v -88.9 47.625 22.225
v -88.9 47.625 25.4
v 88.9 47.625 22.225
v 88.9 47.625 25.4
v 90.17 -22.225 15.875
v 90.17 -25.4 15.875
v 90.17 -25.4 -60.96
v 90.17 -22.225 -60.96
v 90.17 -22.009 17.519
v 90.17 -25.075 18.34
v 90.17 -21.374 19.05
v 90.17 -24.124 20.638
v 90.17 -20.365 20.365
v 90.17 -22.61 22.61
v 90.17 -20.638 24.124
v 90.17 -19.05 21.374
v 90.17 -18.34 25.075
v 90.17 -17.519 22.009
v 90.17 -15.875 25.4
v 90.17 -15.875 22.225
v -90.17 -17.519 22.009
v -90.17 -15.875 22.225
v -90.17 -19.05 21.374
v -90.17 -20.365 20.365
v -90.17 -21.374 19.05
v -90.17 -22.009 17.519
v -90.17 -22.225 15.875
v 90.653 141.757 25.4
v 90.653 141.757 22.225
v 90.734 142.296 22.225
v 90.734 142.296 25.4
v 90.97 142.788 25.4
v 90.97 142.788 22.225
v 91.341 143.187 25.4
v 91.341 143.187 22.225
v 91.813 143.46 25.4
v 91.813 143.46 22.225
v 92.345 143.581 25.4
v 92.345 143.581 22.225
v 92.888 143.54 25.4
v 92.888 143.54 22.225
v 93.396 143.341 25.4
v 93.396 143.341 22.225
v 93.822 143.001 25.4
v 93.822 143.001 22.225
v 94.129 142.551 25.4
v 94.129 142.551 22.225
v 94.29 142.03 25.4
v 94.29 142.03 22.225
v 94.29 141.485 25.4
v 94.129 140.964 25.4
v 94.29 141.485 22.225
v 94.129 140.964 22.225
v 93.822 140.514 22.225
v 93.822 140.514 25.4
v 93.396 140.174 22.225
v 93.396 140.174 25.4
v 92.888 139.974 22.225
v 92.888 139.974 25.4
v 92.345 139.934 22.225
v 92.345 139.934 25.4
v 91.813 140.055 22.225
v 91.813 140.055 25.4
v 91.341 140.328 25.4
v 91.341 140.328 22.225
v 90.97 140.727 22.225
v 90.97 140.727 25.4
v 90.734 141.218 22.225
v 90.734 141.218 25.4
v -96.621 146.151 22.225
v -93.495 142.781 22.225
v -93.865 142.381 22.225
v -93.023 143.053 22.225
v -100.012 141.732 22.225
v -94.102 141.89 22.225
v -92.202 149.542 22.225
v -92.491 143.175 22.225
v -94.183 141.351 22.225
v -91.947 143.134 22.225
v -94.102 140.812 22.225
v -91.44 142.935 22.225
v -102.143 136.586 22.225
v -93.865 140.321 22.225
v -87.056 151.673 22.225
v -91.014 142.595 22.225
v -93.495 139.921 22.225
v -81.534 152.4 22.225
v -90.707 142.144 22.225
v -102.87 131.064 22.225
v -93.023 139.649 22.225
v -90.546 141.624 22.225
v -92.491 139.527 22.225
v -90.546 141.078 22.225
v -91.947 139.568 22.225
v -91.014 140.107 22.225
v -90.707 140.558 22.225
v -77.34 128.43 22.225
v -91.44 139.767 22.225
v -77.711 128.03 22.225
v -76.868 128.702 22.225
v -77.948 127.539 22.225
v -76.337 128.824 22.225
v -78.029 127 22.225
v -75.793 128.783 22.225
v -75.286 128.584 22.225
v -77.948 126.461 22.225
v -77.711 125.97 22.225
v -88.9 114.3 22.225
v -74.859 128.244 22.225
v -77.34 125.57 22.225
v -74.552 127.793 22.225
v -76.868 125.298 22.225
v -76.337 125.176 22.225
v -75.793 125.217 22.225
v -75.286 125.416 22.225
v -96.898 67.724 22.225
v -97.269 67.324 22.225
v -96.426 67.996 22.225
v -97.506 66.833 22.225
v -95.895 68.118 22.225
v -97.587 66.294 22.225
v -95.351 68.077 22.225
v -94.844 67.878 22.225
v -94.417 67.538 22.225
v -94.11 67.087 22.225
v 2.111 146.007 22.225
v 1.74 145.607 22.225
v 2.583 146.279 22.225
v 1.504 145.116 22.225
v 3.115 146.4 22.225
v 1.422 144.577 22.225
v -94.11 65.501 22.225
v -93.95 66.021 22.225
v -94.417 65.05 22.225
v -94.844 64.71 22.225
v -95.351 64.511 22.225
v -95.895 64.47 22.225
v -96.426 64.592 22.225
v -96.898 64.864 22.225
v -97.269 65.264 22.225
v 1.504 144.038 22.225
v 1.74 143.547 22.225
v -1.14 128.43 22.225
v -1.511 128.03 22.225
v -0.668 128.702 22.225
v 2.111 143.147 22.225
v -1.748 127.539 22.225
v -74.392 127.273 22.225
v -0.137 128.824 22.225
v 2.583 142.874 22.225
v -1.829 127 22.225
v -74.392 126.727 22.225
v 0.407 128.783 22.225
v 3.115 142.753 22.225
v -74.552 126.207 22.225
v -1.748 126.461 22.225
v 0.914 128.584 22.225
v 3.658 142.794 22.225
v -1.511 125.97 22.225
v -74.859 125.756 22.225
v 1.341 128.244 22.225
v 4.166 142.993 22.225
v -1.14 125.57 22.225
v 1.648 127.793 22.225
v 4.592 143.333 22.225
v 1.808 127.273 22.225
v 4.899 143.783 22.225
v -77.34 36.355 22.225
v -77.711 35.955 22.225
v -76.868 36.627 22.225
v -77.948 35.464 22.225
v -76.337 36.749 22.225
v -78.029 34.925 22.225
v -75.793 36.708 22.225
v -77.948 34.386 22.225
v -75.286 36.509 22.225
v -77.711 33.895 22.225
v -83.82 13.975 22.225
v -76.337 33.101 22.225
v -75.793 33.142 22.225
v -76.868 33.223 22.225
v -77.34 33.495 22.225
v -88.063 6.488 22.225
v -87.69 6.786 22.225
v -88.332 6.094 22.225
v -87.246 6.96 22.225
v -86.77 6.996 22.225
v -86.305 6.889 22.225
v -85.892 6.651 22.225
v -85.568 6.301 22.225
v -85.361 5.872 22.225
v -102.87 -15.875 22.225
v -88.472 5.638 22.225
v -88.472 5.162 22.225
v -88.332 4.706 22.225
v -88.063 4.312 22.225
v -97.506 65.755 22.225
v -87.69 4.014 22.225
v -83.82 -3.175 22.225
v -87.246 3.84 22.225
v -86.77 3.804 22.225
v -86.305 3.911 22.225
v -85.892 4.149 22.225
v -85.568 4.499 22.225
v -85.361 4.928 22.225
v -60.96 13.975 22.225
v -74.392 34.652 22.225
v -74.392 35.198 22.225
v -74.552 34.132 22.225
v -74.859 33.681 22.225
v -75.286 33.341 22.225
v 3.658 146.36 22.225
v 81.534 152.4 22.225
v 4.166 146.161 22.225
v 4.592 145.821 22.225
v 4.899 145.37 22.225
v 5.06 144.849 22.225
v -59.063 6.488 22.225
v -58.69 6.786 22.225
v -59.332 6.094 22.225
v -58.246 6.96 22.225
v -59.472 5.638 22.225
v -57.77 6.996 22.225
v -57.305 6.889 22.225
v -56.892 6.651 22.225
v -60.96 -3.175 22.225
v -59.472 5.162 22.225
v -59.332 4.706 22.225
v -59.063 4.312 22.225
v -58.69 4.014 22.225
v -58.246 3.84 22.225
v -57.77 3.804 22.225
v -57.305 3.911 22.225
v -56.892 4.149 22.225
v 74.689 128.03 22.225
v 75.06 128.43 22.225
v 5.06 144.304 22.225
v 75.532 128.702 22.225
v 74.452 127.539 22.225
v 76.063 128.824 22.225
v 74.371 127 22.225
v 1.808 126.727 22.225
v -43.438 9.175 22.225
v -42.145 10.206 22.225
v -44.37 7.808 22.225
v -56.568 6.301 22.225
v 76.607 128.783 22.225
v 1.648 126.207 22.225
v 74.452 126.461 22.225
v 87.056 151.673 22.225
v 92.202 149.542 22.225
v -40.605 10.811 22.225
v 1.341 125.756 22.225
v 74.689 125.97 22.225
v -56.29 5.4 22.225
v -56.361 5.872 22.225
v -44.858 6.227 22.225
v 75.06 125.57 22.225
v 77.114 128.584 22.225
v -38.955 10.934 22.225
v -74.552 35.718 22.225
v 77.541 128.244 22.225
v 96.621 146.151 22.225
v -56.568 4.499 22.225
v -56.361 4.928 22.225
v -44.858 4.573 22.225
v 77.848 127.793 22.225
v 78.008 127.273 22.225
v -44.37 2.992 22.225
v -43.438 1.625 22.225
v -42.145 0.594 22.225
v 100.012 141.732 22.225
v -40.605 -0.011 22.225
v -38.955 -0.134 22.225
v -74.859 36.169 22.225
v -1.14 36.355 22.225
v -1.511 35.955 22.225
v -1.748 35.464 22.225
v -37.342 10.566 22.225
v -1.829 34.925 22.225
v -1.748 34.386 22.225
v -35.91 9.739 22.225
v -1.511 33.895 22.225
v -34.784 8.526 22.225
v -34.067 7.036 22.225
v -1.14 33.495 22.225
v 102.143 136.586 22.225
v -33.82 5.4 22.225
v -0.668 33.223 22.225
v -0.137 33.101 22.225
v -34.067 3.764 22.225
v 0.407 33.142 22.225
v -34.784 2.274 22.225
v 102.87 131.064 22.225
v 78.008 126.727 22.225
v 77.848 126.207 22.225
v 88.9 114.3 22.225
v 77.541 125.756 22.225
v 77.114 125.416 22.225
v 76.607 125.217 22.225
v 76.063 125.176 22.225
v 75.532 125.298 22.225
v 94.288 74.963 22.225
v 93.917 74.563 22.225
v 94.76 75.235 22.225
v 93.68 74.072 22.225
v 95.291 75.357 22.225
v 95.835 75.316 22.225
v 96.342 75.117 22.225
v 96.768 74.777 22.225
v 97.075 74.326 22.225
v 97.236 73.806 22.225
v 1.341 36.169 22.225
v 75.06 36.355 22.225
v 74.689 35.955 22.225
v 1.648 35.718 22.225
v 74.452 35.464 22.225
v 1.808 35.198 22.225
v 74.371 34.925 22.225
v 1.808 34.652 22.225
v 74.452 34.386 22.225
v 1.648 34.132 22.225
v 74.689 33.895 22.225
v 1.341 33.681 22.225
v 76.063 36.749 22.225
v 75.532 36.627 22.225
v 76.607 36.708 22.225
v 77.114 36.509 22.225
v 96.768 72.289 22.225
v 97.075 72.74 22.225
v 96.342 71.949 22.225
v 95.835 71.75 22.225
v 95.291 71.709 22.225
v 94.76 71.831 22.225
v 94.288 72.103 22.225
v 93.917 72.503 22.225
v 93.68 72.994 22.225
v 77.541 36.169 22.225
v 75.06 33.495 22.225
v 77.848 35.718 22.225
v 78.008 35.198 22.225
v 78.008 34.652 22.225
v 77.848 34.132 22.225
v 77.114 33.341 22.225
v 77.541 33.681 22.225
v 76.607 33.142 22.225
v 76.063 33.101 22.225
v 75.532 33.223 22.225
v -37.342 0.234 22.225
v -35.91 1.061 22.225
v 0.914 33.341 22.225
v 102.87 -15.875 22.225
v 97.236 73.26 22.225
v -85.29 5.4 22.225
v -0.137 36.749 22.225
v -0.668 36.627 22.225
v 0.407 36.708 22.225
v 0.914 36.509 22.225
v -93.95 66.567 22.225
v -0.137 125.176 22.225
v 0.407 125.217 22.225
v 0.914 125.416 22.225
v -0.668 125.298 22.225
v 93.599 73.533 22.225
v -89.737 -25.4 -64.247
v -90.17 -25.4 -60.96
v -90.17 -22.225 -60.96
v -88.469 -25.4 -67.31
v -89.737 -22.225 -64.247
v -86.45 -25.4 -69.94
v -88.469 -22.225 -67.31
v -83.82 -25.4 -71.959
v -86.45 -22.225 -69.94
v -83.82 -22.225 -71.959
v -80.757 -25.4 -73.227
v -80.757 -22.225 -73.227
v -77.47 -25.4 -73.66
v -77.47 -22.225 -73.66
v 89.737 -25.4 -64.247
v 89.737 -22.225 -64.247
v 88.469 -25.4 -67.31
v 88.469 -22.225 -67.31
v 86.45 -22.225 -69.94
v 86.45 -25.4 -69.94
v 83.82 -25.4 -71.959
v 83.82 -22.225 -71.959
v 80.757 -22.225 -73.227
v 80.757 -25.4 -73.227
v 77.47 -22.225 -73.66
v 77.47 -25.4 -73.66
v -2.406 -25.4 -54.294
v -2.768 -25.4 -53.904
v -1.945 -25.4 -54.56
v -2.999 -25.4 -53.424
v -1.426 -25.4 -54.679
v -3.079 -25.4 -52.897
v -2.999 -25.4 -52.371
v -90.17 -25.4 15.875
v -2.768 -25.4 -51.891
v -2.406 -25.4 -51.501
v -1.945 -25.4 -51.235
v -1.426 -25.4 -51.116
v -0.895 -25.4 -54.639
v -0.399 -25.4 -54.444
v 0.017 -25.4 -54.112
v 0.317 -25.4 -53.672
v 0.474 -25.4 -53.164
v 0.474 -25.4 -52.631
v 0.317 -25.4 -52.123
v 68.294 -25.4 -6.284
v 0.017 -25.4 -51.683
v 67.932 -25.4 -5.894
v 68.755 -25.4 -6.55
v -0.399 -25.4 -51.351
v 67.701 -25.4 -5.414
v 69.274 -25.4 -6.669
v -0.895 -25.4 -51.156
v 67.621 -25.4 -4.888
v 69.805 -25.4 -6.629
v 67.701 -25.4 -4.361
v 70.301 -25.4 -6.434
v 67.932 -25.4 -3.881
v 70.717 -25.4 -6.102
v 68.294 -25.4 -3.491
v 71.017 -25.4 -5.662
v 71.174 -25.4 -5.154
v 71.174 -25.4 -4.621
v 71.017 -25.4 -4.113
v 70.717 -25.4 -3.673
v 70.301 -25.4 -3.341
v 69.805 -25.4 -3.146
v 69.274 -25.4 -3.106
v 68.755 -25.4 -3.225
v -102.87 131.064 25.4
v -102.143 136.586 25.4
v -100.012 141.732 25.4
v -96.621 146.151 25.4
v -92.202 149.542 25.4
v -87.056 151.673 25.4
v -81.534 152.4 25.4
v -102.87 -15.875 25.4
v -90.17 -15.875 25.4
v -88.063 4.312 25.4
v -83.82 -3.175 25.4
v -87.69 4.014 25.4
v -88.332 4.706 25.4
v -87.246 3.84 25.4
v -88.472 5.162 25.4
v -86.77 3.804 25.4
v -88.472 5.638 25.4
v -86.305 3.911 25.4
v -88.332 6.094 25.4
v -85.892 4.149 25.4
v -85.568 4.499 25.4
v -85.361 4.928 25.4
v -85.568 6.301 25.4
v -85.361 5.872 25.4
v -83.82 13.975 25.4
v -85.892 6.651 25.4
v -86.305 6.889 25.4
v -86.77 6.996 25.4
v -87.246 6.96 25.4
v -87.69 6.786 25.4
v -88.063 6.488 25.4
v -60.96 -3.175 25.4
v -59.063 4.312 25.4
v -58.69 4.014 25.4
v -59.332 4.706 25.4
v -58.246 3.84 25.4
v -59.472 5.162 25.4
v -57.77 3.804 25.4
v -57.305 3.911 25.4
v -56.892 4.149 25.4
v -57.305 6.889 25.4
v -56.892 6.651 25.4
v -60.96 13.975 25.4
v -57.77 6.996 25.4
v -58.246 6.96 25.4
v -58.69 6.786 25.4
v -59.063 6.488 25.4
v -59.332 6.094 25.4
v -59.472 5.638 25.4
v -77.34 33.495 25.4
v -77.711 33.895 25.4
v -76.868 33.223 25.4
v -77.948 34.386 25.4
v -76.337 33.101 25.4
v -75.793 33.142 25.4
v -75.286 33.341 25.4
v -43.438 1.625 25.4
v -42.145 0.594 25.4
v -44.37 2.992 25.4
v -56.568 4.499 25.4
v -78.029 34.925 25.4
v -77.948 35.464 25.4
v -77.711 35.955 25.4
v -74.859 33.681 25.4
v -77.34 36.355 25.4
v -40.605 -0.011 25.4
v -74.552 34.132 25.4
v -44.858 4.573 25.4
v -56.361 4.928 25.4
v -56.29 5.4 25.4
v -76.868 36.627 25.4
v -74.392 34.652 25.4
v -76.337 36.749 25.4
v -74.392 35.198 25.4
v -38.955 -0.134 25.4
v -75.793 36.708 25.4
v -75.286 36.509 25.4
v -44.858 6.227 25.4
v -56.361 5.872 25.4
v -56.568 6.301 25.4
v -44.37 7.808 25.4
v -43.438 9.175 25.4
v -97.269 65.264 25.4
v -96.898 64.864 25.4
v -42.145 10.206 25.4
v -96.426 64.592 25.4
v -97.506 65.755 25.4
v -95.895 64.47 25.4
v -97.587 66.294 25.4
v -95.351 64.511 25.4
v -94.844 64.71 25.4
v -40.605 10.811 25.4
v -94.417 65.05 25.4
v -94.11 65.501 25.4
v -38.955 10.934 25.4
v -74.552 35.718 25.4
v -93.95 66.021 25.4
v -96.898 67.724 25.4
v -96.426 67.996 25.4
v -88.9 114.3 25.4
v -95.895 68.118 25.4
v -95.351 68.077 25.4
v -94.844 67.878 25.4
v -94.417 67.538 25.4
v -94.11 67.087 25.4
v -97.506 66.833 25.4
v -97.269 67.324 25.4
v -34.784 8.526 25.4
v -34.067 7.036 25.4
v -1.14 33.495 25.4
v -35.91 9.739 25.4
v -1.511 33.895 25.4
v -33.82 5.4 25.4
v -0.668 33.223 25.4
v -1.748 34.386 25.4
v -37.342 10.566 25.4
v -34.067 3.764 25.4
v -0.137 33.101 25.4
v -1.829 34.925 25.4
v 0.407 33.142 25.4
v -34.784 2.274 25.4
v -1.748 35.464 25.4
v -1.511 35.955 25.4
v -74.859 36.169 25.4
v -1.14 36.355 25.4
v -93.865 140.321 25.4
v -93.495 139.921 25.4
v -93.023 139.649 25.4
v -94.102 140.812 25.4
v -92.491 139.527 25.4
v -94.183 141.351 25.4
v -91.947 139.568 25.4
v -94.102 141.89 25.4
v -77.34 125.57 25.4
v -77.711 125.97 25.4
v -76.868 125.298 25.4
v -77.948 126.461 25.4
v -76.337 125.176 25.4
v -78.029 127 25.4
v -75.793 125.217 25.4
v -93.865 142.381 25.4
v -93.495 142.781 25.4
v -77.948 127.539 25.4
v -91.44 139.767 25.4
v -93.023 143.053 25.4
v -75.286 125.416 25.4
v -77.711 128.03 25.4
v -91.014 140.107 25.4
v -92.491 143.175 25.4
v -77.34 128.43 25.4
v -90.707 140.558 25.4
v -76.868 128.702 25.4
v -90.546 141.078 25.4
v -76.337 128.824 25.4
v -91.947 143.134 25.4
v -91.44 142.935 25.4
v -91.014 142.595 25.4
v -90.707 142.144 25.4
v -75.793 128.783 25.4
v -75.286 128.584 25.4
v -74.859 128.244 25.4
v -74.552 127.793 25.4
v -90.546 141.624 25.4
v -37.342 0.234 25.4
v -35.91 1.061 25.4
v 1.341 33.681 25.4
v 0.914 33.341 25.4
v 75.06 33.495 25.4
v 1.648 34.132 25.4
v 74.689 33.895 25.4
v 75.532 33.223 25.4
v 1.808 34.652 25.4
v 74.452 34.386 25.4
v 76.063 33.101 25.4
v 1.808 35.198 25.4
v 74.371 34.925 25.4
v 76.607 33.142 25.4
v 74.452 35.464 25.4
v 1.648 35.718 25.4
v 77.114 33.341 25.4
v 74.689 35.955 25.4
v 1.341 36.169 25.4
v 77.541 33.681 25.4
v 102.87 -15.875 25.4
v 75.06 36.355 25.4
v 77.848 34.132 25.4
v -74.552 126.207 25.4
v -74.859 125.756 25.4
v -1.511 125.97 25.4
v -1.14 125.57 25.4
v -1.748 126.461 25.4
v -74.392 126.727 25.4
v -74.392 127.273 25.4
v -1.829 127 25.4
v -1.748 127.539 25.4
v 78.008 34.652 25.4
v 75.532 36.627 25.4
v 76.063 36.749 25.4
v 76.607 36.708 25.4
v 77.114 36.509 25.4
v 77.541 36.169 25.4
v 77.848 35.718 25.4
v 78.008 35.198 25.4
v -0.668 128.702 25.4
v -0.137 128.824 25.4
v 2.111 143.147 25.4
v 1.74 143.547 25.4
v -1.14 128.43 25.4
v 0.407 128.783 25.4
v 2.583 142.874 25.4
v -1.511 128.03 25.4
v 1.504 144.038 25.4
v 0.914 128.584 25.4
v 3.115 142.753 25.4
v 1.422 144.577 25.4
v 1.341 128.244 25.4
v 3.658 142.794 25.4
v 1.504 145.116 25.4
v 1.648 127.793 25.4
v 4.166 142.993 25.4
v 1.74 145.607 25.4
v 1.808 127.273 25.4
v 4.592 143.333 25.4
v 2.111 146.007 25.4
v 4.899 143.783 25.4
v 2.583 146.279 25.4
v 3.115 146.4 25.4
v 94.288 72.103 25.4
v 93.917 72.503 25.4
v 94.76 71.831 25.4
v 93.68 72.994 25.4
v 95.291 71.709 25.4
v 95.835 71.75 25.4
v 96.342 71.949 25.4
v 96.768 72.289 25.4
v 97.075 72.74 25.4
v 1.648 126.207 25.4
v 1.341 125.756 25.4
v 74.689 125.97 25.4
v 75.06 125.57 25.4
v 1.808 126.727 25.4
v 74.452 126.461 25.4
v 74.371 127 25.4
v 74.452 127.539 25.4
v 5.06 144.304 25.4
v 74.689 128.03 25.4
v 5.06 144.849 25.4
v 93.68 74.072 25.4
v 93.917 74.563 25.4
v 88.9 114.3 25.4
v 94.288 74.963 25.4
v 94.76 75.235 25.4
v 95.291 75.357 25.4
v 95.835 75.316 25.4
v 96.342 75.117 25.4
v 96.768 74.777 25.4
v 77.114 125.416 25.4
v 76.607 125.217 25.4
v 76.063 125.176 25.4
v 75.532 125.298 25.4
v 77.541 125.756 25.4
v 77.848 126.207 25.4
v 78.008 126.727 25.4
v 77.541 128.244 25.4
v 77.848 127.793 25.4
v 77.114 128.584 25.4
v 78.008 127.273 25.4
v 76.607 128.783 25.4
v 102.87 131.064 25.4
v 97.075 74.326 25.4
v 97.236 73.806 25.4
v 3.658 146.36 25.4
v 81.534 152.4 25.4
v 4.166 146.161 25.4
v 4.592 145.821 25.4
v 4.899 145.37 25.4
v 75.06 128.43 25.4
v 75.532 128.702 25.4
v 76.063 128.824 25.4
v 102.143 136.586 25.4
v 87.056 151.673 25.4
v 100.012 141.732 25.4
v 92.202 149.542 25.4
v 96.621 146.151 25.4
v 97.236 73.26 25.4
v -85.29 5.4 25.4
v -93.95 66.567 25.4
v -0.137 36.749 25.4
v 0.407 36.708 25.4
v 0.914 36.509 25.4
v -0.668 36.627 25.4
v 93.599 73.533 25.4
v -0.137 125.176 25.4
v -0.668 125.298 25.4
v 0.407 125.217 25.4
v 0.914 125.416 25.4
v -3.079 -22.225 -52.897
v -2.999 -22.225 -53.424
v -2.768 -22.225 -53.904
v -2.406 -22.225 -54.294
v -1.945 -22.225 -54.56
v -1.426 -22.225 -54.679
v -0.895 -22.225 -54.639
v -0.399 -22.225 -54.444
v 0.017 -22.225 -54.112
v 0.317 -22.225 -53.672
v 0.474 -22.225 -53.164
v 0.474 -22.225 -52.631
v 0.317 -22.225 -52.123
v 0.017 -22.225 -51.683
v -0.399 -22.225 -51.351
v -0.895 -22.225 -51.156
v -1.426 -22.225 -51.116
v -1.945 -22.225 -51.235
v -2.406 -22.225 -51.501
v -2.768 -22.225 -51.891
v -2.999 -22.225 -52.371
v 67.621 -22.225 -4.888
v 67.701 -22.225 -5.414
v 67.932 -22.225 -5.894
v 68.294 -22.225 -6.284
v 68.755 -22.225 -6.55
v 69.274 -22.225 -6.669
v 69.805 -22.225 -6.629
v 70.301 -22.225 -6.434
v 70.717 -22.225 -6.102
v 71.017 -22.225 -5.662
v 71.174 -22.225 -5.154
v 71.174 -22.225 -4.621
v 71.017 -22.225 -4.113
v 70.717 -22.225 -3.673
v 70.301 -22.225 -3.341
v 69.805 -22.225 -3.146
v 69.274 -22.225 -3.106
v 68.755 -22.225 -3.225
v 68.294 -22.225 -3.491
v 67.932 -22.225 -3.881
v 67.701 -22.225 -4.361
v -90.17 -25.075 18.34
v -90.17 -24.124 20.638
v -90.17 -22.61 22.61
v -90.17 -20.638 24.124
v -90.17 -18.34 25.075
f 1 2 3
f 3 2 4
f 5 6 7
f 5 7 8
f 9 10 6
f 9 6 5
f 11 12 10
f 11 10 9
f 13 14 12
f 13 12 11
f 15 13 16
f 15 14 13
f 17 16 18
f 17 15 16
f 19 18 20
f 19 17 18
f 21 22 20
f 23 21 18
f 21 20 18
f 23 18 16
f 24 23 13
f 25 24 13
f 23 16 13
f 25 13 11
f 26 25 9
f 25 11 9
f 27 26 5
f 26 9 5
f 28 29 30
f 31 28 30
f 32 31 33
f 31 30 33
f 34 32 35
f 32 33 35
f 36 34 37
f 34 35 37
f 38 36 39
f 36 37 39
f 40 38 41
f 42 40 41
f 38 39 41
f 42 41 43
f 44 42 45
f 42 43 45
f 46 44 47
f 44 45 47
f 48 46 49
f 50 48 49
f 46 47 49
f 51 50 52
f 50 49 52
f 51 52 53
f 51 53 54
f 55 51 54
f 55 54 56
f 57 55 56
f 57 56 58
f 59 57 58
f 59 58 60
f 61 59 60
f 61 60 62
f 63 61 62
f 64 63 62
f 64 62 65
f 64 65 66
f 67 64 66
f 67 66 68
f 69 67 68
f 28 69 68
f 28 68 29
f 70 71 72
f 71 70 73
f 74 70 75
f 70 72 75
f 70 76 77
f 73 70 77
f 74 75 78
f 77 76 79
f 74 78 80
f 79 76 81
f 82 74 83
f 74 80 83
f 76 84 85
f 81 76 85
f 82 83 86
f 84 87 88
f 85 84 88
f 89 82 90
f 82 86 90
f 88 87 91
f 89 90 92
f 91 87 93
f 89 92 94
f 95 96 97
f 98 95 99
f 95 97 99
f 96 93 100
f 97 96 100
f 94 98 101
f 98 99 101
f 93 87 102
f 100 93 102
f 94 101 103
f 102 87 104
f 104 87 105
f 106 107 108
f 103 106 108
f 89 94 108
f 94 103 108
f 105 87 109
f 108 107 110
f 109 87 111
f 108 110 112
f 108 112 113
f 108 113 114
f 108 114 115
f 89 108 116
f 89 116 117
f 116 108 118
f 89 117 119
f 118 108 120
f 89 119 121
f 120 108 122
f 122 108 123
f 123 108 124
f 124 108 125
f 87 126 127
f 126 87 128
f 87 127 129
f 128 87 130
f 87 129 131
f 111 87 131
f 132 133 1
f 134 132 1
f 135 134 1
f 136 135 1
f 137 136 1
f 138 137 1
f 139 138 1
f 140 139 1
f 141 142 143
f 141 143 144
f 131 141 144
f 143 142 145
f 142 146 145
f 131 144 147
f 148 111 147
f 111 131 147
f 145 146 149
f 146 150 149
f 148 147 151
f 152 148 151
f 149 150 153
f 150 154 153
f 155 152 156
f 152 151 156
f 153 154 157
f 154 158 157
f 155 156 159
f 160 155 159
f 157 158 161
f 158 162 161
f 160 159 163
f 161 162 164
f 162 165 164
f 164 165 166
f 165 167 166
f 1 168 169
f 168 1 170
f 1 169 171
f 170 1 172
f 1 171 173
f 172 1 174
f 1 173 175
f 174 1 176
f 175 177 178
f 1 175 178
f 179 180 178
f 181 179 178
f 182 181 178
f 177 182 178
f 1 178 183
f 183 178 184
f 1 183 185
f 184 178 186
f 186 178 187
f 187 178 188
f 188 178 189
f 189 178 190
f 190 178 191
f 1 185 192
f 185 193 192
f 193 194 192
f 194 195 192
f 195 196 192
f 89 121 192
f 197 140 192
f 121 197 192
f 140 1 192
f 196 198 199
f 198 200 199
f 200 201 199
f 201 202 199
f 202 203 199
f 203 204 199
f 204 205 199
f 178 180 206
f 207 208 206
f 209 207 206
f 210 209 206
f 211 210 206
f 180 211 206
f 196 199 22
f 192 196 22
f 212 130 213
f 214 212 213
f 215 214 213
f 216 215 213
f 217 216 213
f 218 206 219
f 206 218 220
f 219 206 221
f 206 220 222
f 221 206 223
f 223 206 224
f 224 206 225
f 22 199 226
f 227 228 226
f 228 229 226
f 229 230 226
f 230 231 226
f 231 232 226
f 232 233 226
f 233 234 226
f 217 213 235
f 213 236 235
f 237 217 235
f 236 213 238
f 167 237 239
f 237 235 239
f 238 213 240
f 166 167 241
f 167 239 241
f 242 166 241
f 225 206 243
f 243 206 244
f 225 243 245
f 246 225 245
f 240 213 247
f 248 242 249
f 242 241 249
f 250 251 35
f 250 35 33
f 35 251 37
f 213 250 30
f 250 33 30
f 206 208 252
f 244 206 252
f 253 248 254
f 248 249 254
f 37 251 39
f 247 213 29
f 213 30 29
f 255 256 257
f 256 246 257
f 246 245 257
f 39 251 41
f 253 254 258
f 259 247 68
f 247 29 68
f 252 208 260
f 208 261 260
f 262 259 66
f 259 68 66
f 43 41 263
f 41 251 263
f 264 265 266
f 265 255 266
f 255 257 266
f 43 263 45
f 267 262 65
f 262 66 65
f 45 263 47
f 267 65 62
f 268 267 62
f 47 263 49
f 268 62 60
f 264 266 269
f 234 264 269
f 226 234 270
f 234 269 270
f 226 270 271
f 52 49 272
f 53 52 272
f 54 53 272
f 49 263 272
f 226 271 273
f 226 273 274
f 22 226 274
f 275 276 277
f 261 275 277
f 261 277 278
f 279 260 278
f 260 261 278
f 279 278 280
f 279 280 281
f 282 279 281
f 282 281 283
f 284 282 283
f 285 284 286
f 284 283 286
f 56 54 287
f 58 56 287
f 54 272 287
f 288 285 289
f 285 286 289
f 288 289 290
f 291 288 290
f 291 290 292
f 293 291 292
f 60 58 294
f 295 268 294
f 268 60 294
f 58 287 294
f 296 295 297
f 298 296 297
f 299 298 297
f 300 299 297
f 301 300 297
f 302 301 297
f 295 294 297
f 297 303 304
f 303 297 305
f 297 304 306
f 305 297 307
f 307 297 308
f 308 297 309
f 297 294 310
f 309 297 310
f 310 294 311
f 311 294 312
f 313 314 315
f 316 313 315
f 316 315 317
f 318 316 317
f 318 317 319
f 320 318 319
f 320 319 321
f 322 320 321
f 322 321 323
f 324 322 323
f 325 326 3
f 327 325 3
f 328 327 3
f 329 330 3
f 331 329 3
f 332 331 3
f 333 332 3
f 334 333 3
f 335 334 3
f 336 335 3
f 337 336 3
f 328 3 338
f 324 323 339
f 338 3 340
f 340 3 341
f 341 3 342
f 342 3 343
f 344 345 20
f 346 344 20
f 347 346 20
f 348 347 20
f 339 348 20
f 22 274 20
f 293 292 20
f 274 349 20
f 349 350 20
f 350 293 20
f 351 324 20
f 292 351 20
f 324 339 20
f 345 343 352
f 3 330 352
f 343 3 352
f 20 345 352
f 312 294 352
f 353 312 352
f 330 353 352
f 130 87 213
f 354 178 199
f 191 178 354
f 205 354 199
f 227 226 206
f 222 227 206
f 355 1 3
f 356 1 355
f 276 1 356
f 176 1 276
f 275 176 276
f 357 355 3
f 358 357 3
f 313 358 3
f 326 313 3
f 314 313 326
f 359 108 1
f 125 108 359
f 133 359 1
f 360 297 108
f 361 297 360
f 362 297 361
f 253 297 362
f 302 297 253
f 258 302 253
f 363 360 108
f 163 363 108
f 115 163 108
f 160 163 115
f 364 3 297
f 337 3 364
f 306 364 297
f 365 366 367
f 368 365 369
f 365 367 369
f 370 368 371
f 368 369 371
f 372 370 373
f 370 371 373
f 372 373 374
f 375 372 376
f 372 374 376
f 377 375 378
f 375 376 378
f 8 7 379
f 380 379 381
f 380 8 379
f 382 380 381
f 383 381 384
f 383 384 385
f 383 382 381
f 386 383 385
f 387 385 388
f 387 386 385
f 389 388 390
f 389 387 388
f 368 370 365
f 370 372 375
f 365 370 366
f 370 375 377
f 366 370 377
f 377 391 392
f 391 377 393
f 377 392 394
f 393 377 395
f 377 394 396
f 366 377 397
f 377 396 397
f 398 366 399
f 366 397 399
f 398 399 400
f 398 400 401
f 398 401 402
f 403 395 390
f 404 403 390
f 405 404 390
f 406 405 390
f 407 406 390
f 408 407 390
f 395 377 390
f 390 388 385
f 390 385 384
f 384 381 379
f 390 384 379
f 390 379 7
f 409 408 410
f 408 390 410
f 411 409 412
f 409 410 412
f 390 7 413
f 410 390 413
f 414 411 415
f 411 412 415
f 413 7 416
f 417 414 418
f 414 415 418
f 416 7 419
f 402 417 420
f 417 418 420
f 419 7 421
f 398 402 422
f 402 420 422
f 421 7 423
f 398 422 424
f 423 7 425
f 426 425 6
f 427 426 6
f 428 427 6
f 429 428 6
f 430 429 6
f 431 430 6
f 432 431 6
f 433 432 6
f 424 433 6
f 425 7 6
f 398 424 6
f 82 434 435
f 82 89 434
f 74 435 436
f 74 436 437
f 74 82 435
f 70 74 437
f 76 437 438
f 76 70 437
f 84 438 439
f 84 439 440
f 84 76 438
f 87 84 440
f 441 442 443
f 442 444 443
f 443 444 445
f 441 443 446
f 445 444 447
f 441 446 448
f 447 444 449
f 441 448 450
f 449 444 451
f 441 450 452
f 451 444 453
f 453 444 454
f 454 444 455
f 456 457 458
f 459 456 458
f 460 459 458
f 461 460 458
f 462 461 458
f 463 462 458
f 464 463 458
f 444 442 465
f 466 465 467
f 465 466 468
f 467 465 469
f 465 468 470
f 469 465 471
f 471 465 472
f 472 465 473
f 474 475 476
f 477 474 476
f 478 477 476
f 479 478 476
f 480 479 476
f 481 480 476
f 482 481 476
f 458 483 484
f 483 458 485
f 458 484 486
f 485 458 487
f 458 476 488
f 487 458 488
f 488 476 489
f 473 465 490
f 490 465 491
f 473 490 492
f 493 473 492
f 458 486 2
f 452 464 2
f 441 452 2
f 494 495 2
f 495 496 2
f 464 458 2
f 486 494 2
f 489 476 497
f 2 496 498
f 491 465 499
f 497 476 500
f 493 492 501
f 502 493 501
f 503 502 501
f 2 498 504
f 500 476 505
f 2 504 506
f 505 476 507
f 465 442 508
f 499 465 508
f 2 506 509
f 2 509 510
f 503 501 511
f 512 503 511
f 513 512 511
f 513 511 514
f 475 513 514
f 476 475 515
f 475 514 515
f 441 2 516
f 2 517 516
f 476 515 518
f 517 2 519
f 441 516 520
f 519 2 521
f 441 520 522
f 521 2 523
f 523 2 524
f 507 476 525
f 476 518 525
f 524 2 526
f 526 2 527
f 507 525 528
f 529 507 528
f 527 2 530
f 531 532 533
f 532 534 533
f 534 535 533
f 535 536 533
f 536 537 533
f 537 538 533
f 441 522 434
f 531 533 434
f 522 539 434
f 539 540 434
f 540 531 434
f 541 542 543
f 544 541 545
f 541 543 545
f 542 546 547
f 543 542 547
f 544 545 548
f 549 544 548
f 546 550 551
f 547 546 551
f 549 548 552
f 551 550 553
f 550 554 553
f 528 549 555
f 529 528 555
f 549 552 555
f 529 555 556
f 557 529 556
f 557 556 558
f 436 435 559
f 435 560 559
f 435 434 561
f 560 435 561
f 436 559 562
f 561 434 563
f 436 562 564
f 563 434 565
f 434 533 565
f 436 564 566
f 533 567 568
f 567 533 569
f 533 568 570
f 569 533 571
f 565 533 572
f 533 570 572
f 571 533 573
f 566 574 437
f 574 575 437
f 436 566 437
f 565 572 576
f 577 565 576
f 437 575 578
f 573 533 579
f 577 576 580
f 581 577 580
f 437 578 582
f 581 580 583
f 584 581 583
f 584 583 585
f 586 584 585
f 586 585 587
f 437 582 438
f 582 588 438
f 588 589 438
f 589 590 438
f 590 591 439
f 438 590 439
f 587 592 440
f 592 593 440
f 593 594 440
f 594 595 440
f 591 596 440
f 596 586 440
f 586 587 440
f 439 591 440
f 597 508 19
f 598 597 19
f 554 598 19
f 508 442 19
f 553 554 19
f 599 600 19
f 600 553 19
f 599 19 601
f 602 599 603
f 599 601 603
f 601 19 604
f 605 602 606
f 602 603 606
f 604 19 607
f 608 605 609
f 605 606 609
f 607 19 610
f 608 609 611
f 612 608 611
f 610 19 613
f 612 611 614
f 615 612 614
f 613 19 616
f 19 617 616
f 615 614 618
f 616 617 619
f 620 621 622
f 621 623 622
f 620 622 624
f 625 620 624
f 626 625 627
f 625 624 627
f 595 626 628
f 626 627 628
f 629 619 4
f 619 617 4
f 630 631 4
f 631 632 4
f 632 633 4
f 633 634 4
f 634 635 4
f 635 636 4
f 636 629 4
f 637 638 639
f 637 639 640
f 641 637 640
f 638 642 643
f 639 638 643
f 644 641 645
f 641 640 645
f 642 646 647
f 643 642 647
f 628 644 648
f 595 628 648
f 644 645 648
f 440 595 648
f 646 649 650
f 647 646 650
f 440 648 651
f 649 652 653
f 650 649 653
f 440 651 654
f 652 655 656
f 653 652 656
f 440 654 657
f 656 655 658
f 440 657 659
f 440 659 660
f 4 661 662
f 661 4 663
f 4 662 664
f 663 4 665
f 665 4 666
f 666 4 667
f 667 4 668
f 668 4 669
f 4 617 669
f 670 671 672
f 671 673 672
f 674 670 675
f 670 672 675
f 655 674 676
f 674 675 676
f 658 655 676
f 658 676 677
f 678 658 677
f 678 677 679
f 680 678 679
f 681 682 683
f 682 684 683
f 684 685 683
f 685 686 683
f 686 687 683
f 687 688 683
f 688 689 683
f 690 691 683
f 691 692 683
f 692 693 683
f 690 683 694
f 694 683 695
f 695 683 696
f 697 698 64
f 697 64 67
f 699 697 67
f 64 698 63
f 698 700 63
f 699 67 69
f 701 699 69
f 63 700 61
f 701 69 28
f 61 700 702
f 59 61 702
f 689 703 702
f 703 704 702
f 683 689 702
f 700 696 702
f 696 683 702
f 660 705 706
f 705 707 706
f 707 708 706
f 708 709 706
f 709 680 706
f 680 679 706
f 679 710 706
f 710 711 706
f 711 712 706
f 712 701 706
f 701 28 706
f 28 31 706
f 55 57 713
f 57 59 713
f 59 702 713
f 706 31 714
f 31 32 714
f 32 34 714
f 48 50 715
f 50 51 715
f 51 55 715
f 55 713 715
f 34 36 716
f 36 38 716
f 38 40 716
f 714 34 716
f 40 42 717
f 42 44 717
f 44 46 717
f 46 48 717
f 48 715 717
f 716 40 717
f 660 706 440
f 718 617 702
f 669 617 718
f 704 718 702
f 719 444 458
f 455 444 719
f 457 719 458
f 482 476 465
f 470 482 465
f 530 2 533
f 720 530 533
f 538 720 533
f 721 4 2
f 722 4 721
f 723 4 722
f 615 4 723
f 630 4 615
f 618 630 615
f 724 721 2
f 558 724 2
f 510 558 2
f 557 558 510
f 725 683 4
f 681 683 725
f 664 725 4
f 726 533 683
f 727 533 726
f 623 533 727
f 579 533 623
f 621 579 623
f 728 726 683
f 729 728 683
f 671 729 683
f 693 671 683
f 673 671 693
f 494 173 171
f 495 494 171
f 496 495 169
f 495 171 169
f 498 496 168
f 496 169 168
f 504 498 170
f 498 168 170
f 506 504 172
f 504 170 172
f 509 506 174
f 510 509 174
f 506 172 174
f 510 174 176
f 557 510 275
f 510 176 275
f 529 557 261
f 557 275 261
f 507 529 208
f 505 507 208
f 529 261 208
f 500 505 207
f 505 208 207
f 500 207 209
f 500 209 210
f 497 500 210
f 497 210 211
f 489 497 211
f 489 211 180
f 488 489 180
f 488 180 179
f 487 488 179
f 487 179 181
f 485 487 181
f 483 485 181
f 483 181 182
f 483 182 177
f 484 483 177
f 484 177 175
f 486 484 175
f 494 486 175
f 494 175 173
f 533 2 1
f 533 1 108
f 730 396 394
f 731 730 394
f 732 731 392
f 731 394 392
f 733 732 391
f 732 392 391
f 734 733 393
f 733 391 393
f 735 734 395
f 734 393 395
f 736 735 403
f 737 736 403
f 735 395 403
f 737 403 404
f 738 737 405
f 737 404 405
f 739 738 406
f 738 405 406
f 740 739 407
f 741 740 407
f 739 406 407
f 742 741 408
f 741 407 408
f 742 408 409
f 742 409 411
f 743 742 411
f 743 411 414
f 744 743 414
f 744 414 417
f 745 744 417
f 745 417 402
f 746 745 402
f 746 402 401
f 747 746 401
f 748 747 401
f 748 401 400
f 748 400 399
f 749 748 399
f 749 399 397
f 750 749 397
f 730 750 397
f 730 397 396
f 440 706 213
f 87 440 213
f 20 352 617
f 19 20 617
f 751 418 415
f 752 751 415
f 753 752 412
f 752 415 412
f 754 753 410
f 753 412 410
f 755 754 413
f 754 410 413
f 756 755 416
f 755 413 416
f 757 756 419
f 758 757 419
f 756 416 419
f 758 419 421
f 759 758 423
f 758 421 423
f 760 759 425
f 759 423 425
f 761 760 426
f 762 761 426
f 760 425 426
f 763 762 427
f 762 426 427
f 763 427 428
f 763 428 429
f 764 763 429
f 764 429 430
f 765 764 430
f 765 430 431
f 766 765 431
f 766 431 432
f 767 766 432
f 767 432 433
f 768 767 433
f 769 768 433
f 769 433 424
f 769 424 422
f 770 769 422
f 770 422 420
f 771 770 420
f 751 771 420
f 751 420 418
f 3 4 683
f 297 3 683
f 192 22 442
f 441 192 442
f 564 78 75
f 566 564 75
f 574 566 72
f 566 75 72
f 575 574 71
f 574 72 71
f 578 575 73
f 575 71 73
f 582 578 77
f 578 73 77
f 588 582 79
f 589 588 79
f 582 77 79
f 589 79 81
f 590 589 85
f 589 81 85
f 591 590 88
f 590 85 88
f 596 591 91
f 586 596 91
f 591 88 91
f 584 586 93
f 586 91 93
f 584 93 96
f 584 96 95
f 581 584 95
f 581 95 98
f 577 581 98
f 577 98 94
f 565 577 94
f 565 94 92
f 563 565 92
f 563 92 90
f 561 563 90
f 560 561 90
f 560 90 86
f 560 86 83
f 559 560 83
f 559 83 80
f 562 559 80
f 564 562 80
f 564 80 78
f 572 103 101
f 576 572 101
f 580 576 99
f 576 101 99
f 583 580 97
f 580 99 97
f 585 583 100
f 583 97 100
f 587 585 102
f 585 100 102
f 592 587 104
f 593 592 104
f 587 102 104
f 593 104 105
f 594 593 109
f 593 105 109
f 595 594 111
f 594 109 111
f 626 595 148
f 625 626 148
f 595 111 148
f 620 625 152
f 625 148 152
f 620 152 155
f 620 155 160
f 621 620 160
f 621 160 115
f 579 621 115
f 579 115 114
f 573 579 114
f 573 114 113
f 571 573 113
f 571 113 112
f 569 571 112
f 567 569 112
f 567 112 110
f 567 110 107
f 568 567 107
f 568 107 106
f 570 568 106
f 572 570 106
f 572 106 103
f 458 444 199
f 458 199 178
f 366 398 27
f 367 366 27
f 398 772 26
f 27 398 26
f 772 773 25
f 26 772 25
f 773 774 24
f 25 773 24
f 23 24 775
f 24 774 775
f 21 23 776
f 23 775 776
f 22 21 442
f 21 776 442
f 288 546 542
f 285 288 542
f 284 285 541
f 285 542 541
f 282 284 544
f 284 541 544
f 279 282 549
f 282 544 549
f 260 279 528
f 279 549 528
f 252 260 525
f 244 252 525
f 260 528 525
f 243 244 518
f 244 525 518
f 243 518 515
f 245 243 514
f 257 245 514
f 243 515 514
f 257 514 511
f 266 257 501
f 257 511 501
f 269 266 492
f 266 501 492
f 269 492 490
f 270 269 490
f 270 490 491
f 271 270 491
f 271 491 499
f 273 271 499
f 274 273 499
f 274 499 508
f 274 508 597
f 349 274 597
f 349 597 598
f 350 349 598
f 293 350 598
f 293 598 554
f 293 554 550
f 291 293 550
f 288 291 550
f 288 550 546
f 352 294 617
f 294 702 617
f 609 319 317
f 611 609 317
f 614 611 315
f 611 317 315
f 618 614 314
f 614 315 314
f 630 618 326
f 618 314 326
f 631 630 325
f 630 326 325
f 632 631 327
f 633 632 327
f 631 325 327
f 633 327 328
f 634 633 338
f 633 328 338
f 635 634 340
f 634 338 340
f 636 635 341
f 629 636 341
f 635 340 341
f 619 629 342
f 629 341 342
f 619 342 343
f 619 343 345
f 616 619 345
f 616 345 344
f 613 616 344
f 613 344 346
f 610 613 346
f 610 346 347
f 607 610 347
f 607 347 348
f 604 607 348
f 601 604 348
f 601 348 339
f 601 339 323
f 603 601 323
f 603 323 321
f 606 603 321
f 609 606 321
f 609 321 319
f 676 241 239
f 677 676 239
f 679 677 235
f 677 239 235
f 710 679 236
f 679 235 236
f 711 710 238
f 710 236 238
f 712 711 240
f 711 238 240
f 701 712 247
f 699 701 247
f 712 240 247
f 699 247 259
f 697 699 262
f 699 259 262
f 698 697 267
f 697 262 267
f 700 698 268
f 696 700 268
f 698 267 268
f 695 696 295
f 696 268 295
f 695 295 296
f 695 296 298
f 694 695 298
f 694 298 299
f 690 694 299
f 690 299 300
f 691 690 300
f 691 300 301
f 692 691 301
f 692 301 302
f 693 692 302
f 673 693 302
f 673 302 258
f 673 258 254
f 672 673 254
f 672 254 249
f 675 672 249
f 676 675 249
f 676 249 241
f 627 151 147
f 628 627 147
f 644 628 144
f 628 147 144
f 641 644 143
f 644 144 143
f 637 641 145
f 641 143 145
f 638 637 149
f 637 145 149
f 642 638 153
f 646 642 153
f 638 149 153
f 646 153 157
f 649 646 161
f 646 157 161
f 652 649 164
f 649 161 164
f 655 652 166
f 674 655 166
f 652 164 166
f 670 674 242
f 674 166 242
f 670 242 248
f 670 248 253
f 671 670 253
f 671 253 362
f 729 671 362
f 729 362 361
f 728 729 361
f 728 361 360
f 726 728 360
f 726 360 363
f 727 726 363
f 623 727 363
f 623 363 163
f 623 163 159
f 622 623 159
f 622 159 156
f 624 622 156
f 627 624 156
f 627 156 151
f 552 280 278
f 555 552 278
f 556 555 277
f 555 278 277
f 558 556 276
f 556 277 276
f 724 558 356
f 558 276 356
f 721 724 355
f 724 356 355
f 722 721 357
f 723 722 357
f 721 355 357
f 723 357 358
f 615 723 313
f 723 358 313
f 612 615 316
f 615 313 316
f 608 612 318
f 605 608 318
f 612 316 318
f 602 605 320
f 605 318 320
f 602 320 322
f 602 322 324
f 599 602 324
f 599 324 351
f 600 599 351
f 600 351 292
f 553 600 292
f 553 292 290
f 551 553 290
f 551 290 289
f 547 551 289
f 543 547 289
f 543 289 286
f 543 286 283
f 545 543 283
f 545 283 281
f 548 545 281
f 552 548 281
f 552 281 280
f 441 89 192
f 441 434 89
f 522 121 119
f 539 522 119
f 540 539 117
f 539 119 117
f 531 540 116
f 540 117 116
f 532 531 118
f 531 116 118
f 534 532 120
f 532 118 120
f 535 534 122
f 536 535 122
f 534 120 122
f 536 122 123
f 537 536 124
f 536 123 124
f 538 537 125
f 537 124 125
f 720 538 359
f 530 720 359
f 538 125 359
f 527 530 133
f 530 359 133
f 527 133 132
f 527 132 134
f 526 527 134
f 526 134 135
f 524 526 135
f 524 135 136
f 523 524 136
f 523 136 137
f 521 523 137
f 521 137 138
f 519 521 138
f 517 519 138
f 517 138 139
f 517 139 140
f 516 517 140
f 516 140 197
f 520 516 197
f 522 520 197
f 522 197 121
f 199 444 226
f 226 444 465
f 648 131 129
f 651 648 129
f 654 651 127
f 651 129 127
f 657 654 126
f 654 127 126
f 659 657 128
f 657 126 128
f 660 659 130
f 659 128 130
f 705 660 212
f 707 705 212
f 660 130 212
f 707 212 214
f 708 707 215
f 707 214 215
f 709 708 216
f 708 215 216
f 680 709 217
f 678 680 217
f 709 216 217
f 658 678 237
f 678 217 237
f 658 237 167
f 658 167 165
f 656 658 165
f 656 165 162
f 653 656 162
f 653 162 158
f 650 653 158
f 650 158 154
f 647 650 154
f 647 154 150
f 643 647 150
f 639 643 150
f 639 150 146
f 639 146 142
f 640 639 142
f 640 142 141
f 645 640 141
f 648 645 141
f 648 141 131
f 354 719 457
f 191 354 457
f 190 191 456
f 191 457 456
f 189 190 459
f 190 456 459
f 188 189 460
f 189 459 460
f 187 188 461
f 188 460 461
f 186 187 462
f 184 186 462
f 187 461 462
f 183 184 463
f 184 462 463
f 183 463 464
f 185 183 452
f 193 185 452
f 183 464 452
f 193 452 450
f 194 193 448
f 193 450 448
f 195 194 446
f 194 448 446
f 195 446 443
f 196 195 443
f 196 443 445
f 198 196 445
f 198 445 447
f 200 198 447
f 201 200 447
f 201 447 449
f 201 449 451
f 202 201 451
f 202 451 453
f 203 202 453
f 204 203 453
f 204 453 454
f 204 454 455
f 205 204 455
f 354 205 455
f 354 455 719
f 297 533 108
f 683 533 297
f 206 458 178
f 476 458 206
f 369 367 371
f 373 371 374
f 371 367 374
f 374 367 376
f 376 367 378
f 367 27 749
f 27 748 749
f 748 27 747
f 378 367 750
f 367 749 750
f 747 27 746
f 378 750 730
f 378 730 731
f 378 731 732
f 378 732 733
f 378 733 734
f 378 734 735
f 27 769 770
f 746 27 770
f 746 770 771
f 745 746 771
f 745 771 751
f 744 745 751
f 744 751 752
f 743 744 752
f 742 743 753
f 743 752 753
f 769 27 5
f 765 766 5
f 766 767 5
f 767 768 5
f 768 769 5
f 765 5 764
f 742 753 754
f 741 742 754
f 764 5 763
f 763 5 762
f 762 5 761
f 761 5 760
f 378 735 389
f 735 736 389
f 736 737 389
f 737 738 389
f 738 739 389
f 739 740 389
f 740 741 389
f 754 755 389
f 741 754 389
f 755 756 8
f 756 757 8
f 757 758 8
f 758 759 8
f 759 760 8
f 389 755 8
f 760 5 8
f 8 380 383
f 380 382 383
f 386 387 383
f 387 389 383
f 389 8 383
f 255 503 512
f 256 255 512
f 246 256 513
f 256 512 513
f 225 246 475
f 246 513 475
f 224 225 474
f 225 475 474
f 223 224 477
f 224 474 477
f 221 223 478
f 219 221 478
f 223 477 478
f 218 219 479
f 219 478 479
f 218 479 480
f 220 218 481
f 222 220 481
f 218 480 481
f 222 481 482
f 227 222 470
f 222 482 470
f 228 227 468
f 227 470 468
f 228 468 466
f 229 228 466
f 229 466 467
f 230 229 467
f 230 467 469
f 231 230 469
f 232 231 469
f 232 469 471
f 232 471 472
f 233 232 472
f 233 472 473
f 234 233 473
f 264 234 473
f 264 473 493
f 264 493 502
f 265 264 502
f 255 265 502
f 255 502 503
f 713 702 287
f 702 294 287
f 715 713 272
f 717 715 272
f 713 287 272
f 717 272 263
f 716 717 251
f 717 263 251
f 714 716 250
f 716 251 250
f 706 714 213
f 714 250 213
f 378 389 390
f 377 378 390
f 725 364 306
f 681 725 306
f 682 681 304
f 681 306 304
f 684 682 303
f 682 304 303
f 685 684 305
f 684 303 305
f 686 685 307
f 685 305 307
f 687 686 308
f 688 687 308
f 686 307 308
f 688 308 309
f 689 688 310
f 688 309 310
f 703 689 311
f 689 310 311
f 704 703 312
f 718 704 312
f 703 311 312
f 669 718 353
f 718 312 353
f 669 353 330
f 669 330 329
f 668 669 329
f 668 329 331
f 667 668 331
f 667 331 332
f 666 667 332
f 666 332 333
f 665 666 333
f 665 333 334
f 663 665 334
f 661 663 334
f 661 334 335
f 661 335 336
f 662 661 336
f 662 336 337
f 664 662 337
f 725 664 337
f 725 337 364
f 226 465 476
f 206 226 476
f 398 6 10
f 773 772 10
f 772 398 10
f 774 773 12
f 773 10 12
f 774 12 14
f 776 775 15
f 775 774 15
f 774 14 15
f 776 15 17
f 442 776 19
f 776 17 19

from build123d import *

# Parameters (mm, degrees)
BASE_FLANGE1_DEPTH              = 102.87
SKETCH6_W                       = 9.525
SKETCH6_H                       = 99.06
CUT_EXTRUDE1_DEPTH              = 12.7
FILLET1_R                       = 21.336
FILLET2_R                       = 12.7
SKETCH8_W                       = 177.8
SKETCH8_H                       = 66.675
CUT_EXTRUDE2_DEPTH              = 10.16
F_27_0_144_DIAMETER_HOLE1_D     = 3.6576
F_27_0_144_DIAMETER_HOLE2_D     = 3.6576
CUT_EXTRUDE3_REACH              = 210.856
SKETCH17_R                      = 1.6
SKETCH17_W                      = 22.86
SKETCH17_H                      = 17.15
CUT_EXTRUDE4_REACH              = 210.856
SKETCH18_R                      = 5.5499
F_9_64_0_14063_DIAMETER_HOLE1_D = 3.572002


# Sheet-metal steps are written as plain solids
with BuildPart() as part:
    # Sketch1 → Base-Flange1 (new, symmetric)
    with BuildSketch(Plane.YZ):
        with BuildLine():
            Line((-25.4, -73.66), (-25.4, 15.875))
            ThreePointArc((-25.4, 15.875), (-22.610192091, 22.610192091), (-15.875, 25.4))
            Line((-15.875, 25.4), (152.4, 25.4))
            Line((152.4, 25.4), (152.4, 22.225))
            Line((152.4, 22.225), (-15.875, 22.225))
            ThreePointArc((-15.875, 22.225), (-20.365128061, 20.365128061), (-22.225, 15.875))
            Line((-22.225, 15.875), (-22.225, -73.66))
            Line((-22.225, -73.66), (-25.4, -73.66))
        make_face()
    extrude(amount=BASE_FLANGE1_DEPTH, both=True)

    # Sketch6 → Cut-Extrude1 (cut)
    with BuildSketch(Plane.YZ.offset(102.87)):
        with Locations((-20.6375, -24.13)):
            Rectangle(SKETCH6_W, SKETCH6_H)
    cut_extrude1 = extrude(amount=-CUT_EXTRUDE1_DEPTH, mode=Mode.SUBTRACT)

    # Mirror1: Cut-Extrude1 across plane
    add(cut_extrude1.mirror(Plane(origin=(0, 0, 0), x_dir=(0, 0, 1), z_dir=(1, 0, 0))), mode=Mode.SUBTRACT)

    # Fillet1
    fillet1_edges = [part.edges().sort_by_distance(p)[0] for p in [
        (102.87, 152.4, 23.8125),
        (-102.87, 152.4, 23.8125),
    ]]
    fillet(fillet1_edges, radius=FILLET1_R)

    # Fillet2
    fillet2_edges = [part.edges().sort_by_distance(p)[0] for p in [
        (90.17, -23.8125, -73.66),
        (-90.17, -23.8125, -73.66),
    ]]
    fillet(fillet2_edges, radius=FILLET2_R)

    # Sketch8 → Cut-Extrude2 (cut)
    with BuildSketch(Plane.XY.offset(25.4)):
        with Locations((0, 80.9625)):
            Rectangle(SKETCH8_W, SKETCH8_H)
    extrude(amount=-CUT_EXTRUDE2_DEPTH, mode=Mode.SUBTRACT)

    # #27 (0.144) Diameter Hole1 (through all)
    with Locations(Plane.XY.offset(25.4)):
        with Locations((-76.2, 127), (0, 127), (76.2, 127), (76.2, 34.925), (0, 34.925), (-76.2, 34.925)):
            Hole(F_27_0_144_DIAMETER_HOLE1_D / 2)

    # #27 (0.144) Diameter Hole2 (through all)
    with Locations(Plane.XY.offset(25.4)):
        with Locations((92.4814, 141.7574), (95.4278, 73.533), (95.4278, -25.273), (-95.758, -18.034), (-95.758, 66.294), (-92.3544, 141.351), (3.2512, 144.5768)):
            Hole(F_27_0_144_DIAMETER_HOLE2_D / 2)

    # Sketch17 → Cut-Extrude3 (cut, up to next)
    with BuildSketch(Plane.XY.offset(25.4), mode=Mode.PRIVATE) as cut_extrude3_sk1:
        with Locations((-86.89, 5.4)):
            Circle(SKETCH17_R)
    cut_extrude3_tool1 = extrude(cut_extrude3_sk1.sketch, amount=-CUT_EXTRUDE3_REACH, mode=Mode.PRIVATE) & part.part
    # Sketch17 → Cut-Extrude3 (cut, up to next)
    with BuildSketch(Plane.XY.offset(25.4), mode=Mode.PRIVATE) as cut_extrude3_sk2:
        with Locations((-57.89, 5.4)):
            Circle(SKETCH17_R)
    cut_extrude3_tool2 = extrude(cut_extrude3_sk2.sketch, amount=-CUT_EXTRUDE3_REACH, mode=Mode.PRIVATE) & part.part
    # Sketch17 → Cut-Extrude3 (cut, up to next)
    with BuildSketch(Plane.XY.offset(25.4), mode=Mode.PRIVATE) as cut_extrude3_sk3:
        with Locations((-72.39, 5.4)):
            Rectangle(SKETCH17_W, SKETCH17_H)
    cut_extrude3_tool3 = extrude(cut_extrude3_sk3.sketch, amount=-CUT_EXTRUDE3_REACH, mode=Mode.PRIVATE) & part.part
    add(cut_extrude3_tool1.solids().sort_by_distance((-86.89, 5.4, 25.4))[0], mode=Mode.SUBTRACT)
    add(cut_extrude3_tool2.solids().sort_by_distance((-57.89, 5.4, 25.4))[0], mode=Mode.SUBTRACT)
    add(cut_extrude3_tool3.solids().sort_by_distance((-72.39, 5.4, 25.4))[0], mode=Mode.SUBTRACT)

    # Sketch18 → Cut-Extrude4 (cut, up to next)
    with BuildSketch(Plane.XY.offset(25.4), mode=Mode.PRIVATE) as cut_extrude4_sk1:
        with Locations((-39.37, 5.4)):
            Circle(SKETCH18_R)
    cut_extrude4_tool1 = extrude(cut_extrude4_sk1.sketch, amount=-CUT_EXTRUDE4_REACH, mode=Mode.PRIVATE) & part.part
    add(cut_extrude4_tool1.solids().sort_by_distance((-39.37, 5.4, 25.4))[0], mode=Mode.SUBTRACT)

    # 9/64 (0.14063) Diameter Hole1 (through all)
    with Locations(Plane(origin=(0, -22.225, 0), x_dir=(1, 0, 0), z_dir=(0, 1, 0))):
        with Locations((-1.292500082, 52.897499996), (69.407499996, 4.887500004)):
            Hole(F_9_64_0_14063_DIAMETER_HOLE1_D / 2)


solid = part.part
